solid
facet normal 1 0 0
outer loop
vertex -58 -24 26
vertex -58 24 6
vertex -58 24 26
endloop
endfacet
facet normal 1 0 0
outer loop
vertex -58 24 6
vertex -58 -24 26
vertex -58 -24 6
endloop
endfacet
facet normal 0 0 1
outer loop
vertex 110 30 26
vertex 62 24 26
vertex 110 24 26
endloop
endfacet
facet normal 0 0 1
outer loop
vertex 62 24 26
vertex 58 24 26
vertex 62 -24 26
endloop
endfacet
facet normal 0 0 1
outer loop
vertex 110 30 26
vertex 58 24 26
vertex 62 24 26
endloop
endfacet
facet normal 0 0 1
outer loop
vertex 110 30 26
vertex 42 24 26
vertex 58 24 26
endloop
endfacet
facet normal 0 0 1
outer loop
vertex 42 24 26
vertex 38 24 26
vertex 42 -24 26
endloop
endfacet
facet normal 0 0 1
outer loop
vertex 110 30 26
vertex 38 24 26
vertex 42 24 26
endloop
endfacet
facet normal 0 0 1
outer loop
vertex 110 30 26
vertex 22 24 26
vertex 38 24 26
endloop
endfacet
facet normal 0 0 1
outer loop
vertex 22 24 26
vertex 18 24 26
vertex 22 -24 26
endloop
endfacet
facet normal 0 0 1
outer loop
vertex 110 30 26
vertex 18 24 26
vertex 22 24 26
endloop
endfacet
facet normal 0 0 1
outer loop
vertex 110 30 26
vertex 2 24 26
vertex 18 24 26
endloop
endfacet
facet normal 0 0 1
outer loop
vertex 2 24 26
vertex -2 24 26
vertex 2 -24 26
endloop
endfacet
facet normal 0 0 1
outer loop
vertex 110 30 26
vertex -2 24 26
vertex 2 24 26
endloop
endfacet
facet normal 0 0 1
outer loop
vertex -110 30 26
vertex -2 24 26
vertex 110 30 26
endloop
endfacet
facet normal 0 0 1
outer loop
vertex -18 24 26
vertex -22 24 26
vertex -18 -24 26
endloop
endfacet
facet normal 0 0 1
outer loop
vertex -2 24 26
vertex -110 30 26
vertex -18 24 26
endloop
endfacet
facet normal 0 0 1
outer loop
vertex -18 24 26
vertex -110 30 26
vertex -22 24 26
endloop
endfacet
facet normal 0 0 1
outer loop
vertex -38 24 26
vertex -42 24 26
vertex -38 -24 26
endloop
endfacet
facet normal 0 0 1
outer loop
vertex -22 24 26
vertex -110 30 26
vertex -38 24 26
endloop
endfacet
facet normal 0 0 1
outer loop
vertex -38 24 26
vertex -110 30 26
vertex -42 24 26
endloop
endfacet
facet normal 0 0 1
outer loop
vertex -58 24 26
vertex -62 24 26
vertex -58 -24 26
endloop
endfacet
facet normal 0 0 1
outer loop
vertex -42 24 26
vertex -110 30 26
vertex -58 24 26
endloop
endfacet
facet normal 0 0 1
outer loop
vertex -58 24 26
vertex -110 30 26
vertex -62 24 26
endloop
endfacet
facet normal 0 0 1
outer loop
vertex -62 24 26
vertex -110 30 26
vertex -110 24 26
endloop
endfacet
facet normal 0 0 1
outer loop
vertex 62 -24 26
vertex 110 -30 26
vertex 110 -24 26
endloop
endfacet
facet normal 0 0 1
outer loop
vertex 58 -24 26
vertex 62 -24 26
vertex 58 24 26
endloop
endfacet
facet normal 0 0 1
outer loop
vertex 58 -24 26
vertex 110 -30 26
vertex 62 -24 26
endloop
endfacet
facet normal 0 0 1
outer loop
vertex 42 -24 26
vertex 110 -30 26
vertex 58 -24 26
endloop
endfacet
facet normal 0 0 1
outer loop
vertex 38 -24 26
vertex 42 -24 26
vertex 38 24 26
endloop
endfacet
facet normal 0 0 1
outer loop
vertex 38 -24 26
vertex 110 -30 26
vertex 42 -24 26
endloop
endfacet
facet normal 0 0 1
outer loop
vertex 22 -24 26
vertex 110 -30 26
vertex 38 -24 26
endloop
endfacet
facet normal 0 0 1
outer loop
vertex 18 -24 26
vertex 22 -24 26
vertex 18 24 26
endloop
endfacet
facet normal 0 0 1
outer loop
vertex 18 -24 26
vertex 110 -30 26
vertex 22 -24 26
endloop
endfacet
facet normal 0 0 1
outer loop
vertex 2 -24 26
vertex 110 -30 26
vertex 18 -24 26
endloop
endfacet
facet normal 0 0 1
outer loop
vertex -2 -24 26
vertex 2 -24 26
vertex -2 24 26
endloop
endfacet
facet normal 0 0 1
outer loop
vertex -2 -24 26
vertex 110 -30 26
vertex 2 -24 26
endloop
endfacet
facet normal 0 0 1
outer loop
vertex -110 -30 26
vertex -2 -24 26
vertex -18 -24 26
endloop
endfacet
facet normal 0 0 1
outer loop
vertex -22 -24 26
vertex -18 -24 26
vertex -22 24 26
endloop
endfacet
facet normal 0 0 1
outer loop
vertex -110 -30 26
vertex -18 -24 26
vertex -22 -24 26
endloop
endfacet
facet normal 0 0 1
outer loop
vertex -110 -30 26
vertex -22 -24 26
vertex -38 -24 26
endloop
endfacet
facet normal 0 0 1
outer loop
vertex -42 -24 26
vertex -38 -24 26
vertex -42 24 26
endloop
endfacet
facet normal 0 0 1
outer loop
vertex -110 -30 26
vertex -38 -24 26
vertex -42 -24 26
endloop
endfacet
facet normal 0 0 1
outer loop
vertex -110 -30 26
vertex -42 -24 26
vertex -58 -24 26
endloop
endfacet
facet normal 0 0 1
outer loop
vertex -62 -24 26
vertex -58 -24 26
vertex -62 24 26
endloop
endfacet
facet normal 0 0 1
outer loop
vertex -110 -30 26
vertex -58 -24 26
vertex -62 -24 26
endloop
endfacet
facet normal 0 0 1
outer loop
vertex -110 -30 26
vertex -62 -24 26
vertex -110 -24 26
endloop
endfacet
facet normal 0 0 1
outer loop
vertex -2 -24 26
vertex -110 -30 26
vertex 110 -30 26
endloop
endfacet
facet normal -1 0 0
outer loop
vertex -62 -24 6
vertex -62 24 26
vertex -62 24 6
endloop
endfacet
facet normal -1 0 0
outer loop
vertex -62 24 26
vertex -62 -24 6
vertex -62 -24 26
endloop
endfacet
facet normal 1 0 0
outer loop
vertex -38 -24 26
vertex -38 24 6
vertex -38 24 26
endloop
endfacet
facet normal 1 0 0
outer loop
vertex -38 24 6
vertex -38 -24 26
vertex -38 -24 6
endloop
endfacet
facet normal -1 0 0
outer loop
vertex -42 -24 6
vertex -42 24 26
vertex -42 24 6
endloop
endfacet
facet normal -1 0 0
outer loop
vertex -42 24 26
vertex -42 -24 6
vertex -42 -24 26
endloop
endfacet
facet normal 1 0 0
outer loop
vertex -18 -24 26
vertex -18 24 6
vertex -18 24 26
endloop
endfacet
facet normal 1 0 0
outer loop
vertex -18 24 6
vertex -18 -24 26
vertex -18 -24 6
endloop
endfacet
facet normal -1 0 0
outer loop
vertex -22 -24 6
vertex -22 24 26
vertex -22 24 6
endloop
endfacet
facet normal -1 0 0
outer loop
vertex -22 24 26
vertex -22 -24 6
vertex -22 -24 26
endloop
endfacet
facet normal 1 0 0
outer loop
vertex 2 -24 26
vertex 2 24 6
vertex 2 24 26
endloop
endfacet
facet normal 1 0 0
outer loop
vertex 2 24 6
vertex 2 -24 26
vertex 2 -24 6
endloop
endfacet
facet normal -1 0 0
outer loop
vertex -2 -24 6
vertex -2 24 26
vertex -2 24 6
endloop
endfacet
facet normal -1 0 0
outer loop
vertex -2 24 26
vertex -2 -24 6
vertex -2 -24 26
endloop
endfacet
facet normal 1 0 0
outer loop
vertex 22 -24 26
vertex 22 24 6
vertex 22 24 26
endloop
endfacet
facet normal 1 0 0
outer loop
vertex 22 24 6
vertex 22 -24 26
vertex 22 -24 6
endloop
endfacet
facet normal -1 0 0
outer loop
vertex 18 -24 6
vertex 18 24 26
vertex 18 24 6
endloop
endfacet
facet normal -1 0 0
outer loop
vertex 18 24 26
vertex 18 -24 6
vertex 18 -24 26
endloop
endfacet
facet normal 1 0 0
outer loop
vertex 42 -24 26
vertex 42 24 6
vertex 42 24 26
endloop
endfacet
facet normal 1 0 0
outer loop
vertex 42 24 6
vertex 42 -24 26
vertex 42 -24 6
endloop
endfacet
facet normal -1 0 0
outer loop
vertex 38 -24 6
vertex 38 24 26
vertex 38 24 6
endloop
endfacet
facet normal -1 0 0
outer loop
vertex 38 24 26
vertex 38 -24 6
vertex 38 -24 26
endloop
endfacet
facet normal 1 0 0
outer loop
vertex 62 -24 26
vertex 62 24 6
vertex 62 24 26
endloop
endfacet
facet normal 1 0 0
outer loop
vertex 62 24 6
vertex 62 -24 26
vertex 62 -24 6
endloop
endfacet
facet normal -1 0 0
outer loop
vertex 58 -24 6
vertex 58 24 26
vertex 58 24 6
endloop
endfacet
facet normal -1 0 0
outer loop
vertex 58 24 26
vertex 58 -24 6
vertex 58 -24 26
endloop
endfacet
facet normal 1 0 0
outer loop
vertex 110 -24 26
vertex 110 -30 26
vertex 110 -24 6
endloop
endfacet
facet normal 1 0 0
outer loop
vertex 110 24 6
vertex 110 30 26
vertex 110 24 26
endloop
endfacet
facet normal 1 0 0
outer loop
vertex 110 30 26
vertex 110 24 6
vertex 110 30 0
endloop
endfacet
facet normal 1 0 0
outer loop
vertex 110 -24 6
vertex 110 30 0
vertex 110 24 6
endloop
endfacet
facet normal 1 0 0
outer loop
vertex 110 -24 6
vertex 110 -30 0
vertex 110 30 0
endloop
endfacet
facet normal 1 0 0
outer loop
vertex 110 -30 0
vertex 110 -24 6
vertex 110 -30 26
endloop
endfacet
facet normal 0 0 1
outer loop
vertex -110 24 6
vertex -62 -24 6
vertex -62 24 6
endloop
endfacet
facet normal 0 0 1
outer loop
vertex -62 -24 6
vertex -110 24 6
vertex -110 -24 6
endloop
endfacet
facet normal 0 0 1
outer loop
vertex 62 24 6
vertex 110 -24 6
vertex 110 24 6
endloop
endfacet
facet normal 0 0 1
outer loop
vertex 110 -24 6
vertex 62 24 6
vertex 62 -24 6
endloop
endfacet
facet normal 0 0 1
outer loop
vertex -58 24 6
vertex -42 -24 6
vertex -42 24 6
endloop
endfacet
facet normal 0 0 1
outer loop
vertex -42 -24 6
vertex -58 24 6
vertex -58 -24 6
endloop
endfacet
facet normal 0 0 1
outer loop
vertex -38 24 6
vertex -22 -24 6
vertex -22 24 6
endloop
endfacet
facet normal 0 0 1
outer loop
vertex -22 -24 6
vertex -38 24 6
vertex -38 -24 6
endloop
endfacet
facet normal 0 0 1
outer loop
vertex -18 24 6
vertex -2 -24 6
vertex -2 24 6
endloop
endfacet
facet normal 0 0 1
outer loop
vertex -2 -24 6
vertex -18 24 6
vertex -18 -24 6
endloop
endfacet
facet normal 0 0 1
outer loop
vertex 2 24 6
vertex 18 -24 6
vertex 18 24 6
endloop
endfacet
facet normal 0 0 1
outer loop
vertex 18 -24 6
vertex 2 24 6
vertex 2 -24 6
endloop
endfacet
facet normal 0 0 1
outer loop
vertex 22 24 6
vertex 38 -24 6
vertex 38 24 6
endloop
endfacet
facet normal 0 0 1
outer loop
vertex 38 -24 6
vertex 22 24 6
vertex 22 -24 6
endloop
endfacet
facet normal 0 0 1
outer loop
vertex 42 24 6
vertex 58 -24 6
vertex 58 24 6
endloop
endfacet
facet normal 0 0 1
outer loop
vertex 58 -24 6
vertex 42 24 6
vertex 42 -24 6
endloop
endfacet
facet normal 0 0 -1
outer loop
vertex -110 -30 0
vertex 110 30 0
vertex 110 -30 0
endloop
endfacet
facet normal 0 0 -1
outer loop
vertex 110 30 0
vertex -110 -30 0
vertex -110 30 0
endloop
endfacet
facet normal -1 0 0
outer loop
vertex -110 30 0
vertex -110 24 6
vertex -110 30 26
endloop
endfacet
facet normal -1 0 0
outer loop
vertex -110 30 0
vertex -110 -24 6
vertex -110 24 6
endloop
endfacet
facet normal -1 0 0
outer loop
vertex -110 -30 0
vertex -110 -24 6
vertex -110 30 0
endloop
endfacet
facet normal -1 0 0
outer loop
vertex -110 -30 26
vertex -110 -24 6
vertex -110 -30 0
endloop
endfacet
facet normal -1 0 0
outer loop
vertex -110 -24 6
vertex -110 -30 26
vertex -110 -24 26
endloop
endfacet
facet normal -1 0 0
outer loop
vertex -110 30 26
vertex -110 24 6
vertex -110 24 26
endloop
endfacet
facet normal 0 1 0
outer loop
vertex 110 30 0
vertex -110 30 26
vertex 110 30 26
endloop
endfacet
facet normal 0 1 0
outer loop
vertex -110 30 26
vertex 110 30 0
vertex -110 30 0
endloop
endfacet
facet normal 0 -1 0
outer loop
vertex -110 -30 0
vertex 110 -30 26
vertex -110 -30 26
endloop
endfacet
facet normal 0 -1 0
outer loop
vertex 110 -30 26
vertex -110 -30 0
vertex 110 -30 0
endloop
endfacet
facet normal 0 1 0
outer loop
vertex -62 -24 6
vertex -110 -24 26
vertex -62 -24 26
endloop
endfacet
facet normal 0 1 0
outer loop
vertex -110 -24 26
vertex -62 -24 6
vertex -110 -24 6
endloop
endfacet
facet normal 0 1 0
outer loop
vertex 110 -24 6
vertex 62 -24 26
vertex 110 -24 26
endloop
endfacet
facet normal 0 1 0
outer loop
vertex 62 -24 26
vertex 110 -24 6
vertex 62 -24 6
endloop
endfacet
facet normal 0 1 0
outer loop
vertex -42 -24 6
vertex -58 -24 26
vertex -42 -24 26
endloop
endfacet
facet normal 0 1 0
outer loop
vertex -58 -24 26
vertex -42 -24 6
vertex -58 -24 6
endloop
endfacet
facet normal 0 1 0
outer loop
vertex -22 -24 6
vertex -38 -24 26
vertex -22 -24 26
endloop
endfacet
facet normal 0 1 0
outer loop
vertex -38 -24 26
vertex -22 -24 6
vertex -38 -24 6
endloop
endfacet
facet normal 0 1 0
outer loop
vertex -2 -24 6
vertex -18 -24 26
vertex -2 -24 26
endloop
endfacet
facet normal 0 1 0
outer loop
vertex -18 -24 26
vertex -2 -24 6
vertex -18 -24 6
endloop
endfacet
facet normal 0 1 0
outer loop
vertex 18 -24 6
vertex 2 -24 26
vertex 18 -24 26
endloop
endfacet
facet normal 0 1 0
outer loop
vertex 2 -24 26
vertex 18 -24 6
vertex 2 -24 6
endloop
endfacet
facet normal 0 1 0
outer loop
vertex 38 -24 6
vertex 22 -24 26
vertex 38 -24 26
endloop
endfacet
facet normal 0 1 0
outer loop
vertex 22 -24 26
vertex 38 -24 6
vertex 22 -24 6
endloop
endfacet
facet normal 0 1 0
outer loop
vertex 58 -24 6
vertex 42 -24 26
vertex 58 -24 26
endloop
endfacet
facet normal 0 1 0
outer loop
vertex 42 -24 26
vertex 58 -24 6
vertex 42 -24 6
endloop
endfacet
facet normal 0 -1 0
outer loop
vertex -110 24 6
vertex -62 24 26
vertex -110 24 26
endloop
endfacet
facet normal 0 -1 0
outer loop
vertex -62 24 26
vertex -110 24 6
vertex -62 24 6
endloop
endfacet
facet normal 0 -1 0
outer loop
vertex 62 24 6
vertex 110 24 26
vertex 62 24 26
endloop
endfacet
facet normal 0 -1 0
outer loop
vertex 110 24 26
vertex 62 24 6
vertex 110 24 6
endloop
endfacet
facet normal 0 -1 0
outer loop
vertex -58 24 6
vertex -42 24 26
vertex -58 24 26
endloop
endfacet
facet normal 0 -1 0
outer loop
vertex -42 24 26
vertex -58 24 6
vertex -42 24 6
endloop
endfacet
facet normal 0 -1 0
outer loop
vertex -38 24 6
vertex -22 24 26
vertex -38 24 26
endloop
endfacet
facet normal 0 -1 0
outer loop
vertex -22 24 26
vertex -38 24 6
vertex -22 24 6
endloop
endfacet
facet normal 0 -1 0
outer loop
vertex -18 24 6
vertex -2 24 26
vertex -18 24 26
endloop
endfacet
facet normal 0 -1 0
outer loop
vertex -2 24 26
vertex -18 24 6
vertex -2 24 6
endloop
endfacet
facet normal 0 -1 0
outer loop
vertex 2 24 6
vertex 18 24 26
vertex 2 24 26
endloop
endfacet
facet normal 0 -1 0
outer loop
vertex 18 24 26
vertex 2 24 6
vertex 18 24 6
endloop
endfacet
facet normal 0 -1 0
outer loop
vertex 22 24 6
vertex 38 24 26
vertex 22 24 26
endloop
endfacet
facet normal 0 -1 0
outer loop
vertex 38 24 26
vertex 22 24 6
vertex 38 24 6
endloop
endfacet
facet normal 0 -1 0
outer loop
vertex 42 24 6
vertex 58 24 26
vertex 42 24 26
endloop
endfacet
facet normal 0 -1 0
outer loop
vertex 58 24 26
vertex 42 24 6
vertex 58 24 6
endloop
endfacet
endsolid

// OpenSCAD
$fn = 32;

// ----------------------------------------------------------------------
// Rib frame 220 x 60 x 26
// 7 ribs at 20 mm pitch
// ----------------------------------------------------------------------

// --- parameters (mm) ---
frame = [220, 60, 6];  // base plate size (x, y, z)
rail_w = 6;            // side rail width
ribs = 7;              // number of ribs
rib_t = 4;             // rib thickness
rib_h = 20;            // rib height above the base plate
pitch = 20;            // pitch between rib centres

// --- derived feature positions (mm) ---
span = (ribs - 1) * pitch;          // = 120   distance between the outer ribs
origin_x = -span / 2;               // = -60   X of the first rib
rib_len = frame[1] - 2 * rail_w + 2;  // = 50   rib length, 1 mm into each rail
feature_centers = [
  [origin_x + 0 * pitch, 0],
  [origin_x + 1 * pitch, 0],
  [origin_x + 2 * pitch, 0],
  [origin_x + 3 * pitch, 0],
  [origin_x + 4 * pitch, 0],
  [origin_x + 5 * pitch, 0],
  [origin_x + 6 * pitch, 0]
];   // rib centre line, drives the rib loop

// base plate, two side rails, then the ribs read straight off feature_centers
union() {
  translate([-frame[0] / 2, -frame[1] / 2, 0]) cube(frame);
  translate([-frame[0] / 2, -frame[1] / 2, 0]) cube([frame[0], rail_w, frame[2] + rib_h]);
  translate([-frame[0] / 2, frame[1] / 2 - rail_w, 0]) cube([frame[0], rail_w, frame[2] + rib_h]);
  for (centre = feature_centers)
    translate([centre[0] - rib_t / 2, centre[1] - rib_len / 2, frame[2] - 1])
      cube([rib_t, rib_len, rib_h + 1]);
}
